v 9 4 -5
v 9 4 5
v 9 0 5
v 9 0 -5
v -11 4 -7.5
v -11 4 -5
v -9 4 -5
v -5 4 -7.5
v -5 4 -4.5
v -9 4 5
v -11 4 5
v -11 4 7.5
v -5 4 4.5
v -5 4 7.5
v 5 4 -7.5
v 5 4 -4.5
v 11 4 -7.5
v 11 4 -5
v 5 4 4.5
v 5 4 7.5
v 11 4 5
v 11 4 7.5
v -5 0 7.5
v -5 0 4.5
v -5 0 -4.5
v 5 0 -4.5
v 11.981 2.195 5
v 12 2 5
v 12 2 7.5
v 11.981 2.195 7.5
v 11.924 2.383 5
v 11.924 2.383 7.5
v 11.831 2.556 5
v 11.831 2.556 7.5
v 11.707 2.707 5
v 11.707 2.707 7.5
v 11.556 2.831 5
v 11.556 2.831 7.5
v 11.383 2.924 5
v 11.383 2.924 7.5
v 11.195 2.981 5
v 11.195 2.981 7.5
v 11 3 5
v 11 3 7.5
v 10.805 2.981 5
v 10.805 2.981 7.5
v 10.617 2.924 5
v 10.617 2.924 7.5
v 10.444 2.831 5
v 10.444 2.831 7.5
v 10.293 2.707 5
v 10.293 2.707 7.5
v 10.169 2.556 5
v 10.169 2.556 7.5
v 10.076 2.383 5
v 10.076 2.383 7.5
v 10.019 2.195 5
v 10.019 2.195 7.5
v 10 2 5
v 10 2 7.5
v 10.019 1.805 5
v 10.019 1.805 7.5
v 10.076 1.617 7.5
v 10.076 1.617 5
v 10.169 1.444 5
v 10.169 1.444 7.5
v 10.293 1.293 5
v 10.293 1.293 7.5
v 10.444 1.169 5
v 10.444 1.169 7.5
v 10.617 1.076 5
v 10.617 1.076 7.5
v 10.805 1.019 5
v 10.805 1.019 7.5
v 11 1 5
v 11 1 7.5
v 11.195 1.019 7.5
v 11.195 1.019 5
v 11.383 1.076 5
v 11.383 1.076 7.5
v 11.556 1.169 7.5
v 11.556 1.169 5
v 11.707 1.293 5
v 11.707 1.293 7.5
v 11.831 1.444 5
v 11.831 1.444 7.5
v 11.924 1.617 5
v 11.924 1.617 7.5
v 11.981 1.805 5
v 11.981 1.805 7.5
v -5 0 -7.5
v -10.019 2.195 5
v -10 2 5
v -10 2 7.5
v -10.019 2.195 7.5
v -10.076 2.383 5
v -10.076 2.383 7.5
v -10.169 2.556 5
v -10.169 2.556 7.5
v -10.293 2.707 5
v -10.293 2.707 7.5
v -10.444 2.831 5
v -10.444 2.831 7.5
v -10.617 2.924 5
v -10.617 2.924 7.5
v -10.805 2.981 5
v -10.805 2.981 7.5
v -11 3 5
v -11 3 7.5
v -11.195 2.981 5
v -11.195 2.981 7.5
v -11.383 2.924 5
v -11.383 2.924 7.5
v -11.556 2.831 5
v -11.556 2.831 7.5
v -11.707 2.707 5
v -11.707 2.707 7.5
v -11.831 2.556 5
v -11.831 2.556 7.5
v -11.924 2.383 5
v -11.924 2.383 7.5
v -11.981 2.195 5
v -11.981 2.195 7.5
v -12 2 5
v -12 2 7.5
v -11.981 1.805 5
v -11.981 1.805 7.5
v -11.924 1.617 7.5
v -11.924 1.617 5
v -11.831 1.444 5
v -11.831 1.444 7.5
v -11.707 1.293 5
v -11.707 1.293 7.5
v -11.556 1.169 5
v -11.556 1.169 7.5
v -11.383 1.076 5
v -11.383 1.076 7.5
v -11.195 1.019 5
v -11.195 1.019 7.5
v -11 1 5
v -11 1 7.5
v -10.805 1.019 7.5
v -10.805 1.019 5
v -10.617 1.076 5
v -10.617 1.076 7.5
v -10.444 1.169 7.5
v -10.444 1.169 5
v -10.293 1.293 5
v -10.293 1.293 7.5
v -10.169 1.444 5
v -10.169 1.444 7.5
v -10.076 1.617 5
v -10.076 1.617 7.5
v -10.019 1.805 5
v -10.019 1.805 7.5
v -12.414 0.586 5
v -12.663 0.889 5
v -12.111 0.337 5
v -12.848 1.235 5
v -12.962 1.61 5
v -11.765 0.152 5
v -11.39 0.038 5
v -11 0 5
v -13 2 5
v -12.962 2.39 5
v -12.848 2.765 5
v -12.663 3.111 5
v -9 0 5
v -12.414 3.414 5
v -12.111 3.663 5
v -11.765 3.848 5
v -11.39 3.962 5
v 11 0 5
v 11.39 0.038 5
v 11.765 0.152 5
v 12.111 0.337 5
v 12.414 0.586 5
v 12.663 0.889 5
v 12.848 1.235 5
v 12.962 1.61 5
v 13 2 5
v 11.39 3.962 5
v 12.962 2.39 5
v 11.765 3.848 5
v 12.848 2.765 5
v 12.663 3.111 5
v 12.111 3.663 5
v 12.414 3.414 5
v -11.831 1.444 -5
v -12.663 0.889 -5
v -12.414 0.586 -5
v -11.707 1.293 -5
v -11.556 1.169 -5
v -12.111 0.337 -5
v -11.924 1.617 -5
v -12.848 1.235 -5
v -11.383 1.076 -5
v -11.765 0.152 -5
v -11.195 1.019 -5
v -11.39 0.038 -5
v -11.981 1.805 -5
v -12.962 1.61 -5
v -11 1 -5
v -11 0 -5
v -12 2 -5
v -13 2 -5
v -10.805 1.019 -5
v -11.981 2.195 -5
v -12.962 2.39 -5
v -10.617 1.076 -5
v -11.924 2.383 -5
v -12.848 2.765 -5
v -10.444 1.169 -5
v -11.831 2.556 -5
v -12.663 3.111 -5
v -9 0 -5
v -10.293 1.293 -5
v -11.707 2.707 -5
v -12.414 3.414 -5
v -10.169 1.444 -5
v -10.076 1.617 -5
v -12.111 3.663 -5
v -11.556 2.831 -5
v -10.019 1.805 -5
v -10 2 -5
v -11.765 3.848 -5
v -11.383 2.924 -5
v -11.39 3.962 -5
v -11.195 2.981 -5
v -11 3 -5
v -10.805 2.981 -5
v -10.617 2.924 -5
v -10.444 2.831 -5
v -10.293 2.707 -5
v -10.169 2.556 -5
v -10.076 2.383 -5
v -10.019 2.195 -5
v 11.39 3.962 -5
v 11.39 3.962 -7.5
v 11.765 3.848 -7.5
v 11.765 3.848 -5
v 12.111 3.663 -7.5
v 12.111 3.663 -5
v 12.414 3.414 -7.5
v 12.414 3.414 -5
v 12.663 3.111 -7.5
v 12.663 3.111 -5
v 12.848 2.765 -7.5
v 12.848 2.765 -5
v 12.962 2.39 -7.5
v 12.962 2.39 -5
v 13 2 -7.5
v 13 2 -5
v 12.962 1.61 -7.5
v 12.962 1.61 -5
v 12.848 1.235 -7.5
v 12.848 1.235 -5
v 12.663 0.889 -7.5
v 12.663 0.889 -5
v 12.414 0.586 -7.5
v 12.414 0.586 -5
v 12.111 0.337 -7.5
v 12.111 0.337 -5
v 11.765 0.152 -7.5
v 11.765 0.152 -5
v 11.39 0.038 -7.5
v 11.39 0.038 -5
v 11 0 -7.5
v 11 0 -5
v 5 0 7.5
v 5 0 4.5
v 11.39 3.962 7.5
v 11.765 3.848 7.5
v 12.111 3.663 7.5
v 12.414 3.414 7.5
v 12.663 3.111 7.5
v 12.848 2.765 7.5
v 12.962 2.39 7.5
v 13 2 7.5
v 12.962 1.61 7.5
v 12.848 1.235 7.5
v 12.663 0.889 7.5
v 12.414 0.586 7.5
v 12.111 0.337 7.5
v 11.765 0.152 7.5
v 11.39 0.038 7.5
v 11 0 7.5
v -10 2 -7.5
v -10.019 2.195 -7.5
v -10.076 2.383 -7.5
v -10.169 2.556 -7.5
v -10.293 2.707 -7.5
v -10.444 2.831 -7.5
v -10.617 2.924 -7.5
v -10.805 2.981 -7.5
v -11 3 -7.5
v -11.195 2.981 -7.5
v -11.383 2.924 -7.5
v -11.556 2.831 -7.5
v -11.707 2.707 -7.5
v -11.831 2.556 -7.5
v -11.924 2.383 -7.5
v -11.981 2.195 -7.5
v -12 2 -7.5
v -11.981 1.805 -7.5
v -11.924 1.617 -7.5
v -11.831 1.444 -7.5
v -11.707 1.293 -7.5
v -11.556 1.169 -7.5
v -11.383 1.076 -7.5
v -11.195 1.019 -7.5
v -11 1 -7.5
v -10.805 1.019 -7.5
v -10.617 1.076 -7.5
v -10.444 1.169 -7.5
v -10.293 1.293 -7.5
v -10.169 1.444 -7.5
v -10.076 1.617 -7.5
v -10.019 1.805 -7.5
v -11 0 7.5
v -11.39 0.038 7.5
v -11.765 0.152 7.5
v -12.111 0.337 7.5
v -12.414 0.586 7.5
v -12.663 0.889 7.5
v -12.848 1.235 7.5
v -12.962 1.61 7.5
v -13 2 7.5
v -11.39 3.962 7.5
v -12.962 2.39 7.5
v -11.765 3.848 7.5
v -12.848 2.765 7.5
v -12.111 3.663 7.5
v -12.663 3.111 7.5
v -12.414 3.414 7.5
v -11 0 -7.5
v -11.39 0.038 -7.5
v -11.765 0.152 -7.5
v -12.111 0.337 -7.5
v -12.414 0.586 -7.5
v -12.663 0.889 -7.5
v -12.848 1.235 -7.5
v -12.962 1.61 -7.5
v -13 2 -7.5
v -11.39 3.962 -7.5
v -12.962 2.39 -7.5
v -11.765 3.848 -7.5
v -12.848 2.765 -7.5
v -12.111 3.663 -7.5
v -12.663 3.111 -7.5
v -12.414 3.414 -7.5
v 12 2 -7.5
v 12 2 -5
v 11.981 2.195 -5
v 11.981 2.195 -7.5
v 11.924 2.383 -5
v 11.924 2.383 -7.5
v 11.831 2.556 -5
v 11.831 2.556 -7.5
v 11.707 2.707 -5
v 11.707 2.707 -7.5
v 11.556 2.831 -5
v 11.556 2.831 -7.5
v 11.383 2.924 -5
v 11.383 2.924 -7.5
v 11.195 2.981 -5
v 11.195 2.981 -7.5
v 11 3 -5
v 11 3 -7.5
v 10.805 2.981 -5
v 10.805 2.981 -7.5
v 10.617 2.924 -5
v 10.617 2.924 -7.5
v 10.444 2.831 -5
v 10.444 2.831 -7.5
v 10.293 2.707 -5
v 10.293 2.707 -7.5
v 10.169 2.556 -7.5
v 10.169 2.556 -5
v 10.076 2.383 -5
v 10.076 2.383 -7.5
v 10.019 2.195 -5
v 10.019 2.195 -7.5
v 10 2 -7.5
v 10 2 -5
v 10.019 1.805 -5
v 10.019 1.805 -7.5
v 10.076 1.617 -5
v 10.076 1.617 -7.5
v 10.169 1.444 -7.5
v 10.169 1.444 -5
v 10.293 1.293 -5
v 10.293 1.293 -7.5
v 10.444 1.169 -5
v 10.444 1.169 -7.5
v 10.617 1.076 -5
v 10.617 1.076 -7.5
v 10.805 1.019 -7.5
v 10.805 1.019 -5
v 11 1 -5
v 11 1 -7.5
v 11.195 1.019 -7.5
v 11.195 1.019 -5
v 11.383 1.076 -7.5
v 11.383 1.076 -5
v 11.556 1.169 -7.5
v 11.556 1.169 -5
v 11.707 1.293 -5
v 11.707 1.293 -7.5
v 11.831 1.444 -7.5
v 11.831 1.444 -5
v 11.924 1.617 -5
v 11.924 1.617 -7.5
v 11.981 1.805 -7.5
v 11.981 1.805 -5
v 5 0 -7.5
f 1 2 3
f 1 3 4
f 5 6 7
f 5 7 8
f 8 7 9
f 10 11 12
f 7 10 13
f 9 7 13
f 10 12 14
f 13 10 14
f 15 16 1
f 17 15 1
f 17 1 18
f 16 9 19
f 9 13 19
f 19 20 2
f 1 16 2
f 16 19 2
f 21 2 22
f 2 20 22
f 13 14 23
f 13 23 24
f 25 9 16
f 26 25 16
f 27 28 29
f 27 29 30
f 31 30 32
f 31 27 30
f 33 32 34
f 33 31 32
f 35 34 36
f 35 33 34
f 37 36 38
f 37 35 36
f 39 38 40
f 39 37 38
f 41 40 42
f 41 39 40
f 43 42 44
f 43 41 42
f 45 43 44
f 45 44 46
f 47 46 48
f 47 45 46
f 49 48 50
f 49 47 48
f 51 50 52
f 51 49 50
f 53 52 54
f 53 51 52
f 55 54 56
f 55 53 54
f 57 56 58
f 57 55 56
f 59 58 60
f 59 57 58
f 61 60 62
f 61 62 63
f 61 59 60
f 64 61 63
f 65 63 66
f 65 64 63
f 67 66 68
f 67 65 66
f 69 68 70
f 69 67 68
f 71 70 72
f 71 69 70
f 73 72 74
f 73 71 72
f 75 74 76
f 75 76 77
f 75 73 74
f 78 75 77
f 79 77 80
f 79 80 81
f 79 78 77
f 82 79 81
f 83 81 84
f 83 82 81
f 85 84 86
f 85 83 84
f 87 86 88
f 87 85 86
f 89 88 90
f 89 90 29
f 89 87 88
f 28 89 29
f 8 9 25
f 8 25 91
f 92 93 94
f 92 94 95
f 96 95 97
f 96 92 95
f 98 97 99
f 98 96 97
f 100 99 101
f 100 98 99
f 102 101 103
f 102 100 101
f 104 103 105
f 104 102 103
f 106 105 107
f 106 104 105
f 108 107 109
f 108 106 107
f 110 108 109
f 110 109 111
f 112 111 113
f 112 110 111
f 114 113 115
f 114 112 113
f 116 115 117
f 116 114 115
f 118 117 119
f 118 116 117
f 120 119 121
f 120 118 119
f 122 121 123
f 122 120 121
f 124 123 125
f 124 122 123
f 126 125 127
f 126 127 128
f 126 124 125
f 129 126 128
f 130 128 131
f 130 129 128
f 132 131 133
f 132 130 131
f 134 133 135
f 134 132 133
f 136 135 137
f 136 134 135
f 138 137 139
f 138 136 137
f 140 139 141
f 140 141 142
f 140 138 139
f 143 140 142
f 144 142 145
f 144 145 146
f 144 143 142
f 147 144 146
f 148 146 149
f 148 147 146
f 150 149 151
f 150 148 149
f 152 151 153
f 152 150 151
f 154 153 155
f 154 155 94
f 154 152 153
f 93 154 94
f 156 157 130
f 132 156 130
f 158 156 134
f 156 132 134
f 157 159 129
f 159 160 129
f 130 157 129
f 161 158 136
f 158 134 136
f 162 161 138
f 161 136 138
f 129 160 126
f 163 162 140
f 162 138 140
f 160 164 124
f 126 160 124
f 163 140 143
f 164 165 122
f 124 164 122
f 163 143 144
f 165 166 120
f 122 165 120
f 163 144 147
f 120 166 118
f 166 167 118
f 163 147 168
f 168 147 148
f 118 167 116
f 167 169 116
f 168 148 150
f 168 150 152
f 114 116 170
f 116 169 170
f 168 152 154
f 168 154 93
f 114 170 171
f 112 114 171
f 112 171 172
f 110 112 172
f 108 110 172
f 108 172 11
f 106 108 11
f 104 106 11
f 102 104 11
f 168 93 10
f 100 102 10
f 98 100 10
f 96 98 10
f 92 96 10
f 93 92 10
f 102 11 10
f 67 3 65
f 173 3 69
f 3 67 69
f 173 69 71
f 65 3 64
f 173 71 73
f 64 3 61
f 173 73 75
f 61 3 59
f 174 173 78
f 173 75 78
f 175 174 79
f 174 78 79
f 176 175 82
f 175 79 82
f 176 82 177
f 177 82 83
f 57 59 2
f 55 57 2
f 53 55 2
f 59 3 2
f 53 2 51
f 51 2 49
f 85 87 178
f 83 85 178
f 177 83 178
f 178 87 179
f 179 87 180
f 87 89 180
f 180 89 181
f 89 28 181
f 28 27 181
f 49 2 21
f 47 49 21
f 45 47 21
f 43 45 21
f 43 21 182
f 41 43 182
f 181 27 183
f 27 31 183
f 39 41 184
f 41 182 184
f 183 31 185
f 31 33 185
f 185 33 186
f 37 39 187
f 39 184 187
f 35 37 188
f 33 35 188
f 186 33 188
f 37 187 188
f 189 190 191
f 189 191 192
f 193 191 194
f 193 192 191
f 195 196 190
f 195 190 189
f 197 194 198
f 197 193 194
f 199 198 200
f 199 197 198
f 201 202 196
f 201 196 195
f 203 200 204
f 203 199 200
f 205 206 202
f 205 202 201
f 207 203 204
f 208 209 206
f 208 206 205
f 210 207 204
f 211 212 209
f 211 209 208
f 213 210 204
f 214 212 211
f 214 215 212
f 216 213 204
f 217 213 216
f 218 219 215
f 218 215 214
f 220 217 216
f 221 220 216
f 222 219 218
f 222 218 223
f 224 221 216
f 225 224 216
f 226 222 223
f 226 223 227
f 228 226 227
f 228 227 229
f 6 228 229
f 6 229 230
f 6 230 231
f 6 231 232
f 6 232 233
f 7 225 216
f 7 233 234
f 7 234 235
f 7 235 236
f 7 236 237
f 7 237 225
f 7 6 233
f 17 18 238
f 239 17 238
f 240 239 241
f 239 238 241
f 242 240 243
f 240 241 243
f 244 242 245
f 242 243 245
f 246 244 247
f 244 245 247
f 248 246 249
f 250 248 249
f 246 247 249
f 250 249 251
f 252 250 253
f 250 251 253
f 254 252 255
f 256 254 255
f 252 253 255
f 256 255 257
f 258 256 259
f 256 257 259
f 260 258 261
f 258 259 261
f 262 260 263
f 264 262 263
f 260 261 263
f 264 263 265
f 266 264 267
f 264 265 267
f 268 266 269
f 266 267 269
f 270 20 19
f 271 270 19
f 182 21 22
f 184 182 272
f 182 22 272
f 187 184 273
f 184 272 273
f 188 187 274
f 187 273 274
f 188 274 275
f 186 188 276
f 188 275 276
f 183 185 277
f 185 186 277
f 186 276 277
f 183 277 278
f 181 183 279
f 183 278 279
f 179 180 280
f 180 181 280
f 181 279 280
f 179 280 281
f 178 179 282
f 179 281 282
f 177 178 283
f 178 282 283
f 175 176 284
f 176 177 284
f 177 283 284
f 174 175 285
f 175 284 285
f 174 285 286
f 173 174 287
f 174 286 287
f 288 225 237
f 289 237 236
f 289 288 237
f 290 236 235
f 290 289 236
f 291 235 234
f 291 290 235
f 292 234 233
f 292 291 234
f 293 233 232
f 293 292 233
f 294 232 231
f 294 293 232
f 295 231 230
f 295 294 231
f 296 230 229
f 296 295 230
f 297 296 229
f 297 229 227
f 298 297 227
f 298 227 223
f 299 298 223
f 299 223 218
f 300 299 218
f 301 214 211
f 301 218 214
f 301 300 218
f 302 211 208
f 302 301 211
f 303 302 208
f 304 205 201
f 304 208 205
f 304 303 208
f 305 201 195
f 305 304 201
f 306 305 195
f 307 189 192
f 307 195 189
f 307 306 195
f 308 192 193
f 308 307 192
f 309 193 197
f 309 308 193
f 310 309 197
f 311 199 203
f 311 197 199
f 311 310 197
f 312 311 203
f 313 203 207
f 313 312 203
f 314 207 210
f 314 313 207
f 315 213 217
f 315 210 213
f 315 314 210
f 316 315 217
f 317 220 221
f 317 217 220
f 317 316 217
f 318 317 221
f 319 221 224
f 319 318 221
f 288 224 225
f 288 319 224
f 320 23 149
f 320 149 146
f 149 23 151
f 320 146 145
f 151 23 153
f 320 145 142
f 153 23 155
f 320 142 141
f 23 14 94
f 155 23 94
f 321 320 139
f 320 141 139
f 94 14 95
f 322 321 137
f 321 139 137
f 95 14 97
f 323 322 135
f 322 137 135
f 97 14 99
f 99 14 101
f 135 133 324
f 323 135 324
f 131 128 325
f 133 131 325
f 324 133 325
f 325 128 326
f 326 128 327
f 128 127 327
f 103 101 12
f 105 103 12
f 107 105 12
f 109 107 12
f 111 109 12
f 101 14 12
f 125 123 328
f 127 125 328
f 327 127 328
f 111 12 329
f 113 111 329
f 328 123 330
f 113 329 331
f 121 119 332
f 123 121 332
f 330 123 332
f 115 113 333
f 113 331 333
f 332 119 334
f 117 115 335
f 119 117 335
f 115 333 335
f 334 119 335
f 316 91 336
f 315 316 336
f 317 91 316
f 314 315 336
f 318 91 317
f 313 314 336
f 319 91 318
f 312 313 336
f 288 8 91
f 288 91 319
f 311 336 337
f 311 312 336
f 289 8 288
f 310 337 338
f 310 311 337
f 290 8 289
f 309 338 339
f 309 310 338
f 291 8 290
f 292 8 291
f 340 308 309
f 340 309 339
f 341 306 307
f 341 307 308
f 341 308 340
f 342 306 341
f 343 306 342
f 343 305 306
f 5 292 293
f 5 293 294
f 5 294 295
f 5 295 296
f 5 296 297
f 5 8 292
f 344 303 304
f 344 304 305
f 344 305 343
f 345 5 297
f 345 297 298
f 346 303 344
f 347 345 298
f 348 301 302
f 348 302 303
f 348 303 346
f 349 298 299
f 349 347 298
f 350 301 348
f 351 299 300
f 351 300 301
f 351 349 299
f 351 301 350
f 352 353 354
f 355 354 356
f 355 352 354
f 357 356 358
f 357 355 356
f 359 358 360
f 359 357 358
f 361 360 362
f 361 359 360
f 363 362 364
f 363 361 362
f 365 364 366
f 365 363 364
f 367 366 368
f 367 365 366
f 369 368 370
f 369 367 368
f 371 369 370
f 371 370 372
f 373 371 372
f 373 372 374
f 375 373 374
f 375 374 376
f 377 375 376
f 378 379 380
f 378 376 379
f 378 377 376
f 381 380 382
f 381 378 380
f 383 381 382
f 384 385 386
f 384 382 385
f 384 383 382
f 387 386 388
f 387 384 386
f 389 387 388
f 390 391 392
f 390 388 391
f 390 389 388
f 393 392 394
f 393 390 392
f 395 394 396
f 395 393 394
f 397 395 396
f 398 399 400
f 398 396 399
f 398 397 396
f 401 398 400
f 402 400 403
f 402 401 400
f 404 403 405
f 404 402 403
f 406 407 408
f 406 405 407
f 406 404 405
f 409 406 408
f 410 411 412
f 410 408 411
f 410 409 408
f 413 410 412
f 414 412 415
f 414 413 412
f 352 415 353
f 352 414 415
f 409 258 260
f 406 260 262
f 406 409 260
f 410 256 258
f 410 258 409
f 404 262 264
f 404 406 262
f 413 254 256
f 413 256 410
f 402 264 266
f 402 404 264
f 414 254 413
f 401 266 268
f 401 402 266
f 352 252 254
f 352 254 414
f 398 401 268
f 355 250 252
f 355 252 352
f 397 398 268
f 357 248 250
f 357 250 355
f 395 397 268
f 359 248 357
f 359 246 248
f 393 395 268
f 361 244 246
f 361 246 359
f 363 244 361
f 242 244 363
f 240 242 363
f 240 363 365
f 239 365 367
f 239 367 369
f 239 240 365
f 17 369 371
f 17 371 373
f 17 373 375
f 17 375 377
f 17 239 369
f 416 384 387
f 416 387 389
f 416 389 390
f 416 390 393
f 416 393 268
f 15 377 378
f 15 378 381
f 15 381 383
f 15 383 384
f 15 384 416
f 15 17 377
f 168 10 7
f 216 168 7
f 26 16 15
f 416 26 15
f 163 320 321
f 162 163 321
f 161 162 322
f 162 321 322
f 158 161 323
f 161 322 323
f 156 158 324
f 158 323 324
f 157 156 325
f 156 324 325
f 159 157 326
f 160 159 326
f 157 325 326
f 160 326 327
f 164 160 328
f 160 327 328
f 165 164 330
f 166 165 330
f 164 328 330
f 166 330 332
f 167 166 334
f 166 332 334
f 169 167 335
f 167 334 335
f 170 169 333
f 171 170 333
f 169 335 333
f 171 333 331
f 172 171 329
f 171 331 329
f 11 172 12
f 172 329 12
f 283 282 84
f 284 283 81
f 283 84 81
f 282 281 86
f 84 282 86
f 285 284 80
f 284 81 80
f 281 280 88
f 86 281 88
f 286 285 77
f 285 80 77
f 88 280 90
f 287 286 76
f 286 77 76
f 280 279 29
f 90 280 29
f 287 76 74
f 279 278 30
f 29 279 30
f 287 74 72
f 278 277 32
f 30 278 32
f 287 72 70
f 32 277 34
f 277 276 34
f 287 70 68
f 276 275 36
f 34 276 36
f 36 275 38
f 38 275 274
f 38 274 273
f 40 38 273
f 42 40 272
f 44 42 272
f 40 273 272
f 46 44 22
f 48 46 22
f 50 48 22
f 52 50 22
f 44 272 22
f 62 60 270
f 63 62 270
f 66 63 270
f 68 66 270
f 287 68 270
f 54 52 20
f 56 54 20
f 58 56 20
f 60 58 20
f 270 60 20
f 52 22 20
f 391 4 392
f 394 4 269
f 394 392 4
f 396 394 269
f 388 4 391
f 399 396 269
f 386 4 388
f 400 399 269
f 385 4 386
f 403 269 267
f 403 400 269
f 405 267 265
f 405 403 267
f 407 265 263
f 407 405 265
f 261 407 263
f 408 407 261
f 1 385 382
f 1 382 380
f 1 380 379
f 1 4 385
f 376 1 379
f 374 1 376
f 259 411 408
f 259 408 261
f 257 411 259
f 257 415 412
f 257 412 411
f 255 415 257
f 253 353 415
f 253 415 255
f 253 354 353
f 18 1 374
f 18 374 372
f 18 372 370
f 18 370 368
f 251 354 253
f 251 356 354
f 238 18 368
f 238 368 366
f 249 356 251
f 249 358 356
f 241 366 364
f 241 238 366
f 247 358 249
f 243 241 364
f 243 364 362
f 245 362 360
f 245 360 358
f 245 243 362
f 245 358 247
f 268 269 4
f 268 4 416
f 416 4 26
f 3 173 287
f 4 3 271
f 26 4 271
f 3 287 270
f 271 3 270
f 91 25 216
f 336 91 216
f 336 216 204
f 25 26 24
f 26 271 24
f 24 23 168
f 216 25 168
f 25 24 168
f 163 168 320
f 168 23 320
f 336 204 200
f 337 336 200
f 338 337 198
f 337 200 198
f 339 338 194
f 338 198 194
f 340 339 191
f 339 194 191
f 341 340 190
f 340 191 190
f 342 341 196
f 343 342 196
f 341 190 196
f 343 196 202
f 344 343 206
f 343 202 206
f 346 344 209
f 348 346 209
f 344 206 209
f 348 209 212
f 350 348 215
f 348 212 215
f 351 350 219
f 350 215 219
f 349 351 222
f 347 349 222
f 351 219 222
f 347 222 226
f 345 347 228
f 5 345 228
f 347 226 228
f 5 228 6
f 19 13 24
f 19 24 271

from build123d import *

# Parameters (mm, degrees)
SKETCH1_R           = 1
BOSS_EXTRUDE1_DEPTH = 7.5
CUT_EXTRUDE1_REACH  = 17.532
SKETCH2_W           = 4
SKETCH2_H           = 10
SKETCH2_W_2         = 10
SKETCH2_H_2         = 3


with BuildPart() as part:
    # Sketch1 → Boss-Extrude1 (new, symmetric)
    with BuildSketch(Plane.XY):
        with BuildLine():
            Line((-11, 4), (11, 4))
            ThreePointArc((11, 4), (13, 2), (11, 0))
            Line((11, 0), (-11, 0))
            ThreePointArc((-11, 0), (-13, 2), (-11, 4))
        make_face()
        with Locations((-11, 2)):
            Circle(SKETCH1_R, mode=Mode.SUBTRACT)
        with Locations((11, 2)):
            Circle(SKETCH1_R, mode=Mode.SUBTRACT)
    extrude(amount=BOSS_EXTRUDE1_DEPTH, both=True)

    # Sketch2 → Cut-Extrude1 (cut, up to next)
    with BuildSketch(Plane(origin=(0, 4, 0), x_dir=(1, 0, 0), z_dir=(0, 1, 0)), mode=Mode.PRIVATE) as cut_extrude1_sk1:
        with Locations((-11, 0)):
            Rectangle(SKETCH2_W, SKETCH2_H)
    cut_extrude1_tool1 = extrude(cut_extrude1_sk1.sketch, amount=-CUT_EXTRUDE1_REACH, mode=Mode.PRIVATE) & part.part
    # Sketch2 → Cut-Extrude1 (cut, up to next)
    with BuildSketch(Plane(origin=(0, 4, 0), x_dir=(1, 0, 0), z_dir=(0, 1, 0)), mode=Mode.PRIVATE) as cut_extrude1_sk2:
        with Locations((0, 6)):
            Rectangle(SKETCH2_W_2, SKETCH2_H_2)
    cut_extrude1_tool2 = extrude(cut_extrude1_sk2.sketch, amount=-CUT_EXTRUDE1_REACH, mode=Mode.PRIVATE) & part.part
    # Sketch2 → Cut-Extrude1 (cut, up to next)
    with BuildSketch(Plane(origin=(0, 4, 0), x_dir=(1, 0, 0), z_dir=(0, 1, 0)), mode=Mode.PRIVATE) as cut_extrude1_sk3:
        with Locations((0, -6)):
            Rectangle(SKETCH2_W_2, SKETCH2_H_2)
    cut_extrude1_tool3 = extrude(cut_extrude1_sk3.sketch, amount=-CUT_EXTRUDE1_REACH, mode=Mode.PRIVATE) & part.part
    # Sketch2 → Cut-Extrude1 (cut, up to next)
    with BuildSketch(Plane(origin=(0, 4, 0), x_dir=(1, 0, 0), z_dir=(0, 1, 0)), mode=Mode.PRIVATE) as cut_extrude1_sk4:
        with Locations((11, 0)):
            Rectangle(SKETCH2_W, SKETCH2_H)
    cut_extrude1_tool4 = extrude(cut_extrude1_sk4.sketch, amount=-CUT_EXTRUDE1_REACH, mode=Mode.PRIVATE) & part.part
    add(cut_extrude1_tool1.solids().sort_by_distance((-11, 4, 0))[0], mode=Mode.SUBTRACT)
    add(cut_extrude1_tool2.solids().sort_by_distance((0, 4, -6))[0], mode=Mode.SUBTRACT)
    add(cut_extrude1_tool3.solids().sort_by_distance((0, 4, 6))[0], mode=Mode.SUBTRACT)
    add(cut_extrude1_tool4.solids().sort_by_distance((11, 4, 0))[0], mode=Mode.SUBTRACT)


solid = part.part
